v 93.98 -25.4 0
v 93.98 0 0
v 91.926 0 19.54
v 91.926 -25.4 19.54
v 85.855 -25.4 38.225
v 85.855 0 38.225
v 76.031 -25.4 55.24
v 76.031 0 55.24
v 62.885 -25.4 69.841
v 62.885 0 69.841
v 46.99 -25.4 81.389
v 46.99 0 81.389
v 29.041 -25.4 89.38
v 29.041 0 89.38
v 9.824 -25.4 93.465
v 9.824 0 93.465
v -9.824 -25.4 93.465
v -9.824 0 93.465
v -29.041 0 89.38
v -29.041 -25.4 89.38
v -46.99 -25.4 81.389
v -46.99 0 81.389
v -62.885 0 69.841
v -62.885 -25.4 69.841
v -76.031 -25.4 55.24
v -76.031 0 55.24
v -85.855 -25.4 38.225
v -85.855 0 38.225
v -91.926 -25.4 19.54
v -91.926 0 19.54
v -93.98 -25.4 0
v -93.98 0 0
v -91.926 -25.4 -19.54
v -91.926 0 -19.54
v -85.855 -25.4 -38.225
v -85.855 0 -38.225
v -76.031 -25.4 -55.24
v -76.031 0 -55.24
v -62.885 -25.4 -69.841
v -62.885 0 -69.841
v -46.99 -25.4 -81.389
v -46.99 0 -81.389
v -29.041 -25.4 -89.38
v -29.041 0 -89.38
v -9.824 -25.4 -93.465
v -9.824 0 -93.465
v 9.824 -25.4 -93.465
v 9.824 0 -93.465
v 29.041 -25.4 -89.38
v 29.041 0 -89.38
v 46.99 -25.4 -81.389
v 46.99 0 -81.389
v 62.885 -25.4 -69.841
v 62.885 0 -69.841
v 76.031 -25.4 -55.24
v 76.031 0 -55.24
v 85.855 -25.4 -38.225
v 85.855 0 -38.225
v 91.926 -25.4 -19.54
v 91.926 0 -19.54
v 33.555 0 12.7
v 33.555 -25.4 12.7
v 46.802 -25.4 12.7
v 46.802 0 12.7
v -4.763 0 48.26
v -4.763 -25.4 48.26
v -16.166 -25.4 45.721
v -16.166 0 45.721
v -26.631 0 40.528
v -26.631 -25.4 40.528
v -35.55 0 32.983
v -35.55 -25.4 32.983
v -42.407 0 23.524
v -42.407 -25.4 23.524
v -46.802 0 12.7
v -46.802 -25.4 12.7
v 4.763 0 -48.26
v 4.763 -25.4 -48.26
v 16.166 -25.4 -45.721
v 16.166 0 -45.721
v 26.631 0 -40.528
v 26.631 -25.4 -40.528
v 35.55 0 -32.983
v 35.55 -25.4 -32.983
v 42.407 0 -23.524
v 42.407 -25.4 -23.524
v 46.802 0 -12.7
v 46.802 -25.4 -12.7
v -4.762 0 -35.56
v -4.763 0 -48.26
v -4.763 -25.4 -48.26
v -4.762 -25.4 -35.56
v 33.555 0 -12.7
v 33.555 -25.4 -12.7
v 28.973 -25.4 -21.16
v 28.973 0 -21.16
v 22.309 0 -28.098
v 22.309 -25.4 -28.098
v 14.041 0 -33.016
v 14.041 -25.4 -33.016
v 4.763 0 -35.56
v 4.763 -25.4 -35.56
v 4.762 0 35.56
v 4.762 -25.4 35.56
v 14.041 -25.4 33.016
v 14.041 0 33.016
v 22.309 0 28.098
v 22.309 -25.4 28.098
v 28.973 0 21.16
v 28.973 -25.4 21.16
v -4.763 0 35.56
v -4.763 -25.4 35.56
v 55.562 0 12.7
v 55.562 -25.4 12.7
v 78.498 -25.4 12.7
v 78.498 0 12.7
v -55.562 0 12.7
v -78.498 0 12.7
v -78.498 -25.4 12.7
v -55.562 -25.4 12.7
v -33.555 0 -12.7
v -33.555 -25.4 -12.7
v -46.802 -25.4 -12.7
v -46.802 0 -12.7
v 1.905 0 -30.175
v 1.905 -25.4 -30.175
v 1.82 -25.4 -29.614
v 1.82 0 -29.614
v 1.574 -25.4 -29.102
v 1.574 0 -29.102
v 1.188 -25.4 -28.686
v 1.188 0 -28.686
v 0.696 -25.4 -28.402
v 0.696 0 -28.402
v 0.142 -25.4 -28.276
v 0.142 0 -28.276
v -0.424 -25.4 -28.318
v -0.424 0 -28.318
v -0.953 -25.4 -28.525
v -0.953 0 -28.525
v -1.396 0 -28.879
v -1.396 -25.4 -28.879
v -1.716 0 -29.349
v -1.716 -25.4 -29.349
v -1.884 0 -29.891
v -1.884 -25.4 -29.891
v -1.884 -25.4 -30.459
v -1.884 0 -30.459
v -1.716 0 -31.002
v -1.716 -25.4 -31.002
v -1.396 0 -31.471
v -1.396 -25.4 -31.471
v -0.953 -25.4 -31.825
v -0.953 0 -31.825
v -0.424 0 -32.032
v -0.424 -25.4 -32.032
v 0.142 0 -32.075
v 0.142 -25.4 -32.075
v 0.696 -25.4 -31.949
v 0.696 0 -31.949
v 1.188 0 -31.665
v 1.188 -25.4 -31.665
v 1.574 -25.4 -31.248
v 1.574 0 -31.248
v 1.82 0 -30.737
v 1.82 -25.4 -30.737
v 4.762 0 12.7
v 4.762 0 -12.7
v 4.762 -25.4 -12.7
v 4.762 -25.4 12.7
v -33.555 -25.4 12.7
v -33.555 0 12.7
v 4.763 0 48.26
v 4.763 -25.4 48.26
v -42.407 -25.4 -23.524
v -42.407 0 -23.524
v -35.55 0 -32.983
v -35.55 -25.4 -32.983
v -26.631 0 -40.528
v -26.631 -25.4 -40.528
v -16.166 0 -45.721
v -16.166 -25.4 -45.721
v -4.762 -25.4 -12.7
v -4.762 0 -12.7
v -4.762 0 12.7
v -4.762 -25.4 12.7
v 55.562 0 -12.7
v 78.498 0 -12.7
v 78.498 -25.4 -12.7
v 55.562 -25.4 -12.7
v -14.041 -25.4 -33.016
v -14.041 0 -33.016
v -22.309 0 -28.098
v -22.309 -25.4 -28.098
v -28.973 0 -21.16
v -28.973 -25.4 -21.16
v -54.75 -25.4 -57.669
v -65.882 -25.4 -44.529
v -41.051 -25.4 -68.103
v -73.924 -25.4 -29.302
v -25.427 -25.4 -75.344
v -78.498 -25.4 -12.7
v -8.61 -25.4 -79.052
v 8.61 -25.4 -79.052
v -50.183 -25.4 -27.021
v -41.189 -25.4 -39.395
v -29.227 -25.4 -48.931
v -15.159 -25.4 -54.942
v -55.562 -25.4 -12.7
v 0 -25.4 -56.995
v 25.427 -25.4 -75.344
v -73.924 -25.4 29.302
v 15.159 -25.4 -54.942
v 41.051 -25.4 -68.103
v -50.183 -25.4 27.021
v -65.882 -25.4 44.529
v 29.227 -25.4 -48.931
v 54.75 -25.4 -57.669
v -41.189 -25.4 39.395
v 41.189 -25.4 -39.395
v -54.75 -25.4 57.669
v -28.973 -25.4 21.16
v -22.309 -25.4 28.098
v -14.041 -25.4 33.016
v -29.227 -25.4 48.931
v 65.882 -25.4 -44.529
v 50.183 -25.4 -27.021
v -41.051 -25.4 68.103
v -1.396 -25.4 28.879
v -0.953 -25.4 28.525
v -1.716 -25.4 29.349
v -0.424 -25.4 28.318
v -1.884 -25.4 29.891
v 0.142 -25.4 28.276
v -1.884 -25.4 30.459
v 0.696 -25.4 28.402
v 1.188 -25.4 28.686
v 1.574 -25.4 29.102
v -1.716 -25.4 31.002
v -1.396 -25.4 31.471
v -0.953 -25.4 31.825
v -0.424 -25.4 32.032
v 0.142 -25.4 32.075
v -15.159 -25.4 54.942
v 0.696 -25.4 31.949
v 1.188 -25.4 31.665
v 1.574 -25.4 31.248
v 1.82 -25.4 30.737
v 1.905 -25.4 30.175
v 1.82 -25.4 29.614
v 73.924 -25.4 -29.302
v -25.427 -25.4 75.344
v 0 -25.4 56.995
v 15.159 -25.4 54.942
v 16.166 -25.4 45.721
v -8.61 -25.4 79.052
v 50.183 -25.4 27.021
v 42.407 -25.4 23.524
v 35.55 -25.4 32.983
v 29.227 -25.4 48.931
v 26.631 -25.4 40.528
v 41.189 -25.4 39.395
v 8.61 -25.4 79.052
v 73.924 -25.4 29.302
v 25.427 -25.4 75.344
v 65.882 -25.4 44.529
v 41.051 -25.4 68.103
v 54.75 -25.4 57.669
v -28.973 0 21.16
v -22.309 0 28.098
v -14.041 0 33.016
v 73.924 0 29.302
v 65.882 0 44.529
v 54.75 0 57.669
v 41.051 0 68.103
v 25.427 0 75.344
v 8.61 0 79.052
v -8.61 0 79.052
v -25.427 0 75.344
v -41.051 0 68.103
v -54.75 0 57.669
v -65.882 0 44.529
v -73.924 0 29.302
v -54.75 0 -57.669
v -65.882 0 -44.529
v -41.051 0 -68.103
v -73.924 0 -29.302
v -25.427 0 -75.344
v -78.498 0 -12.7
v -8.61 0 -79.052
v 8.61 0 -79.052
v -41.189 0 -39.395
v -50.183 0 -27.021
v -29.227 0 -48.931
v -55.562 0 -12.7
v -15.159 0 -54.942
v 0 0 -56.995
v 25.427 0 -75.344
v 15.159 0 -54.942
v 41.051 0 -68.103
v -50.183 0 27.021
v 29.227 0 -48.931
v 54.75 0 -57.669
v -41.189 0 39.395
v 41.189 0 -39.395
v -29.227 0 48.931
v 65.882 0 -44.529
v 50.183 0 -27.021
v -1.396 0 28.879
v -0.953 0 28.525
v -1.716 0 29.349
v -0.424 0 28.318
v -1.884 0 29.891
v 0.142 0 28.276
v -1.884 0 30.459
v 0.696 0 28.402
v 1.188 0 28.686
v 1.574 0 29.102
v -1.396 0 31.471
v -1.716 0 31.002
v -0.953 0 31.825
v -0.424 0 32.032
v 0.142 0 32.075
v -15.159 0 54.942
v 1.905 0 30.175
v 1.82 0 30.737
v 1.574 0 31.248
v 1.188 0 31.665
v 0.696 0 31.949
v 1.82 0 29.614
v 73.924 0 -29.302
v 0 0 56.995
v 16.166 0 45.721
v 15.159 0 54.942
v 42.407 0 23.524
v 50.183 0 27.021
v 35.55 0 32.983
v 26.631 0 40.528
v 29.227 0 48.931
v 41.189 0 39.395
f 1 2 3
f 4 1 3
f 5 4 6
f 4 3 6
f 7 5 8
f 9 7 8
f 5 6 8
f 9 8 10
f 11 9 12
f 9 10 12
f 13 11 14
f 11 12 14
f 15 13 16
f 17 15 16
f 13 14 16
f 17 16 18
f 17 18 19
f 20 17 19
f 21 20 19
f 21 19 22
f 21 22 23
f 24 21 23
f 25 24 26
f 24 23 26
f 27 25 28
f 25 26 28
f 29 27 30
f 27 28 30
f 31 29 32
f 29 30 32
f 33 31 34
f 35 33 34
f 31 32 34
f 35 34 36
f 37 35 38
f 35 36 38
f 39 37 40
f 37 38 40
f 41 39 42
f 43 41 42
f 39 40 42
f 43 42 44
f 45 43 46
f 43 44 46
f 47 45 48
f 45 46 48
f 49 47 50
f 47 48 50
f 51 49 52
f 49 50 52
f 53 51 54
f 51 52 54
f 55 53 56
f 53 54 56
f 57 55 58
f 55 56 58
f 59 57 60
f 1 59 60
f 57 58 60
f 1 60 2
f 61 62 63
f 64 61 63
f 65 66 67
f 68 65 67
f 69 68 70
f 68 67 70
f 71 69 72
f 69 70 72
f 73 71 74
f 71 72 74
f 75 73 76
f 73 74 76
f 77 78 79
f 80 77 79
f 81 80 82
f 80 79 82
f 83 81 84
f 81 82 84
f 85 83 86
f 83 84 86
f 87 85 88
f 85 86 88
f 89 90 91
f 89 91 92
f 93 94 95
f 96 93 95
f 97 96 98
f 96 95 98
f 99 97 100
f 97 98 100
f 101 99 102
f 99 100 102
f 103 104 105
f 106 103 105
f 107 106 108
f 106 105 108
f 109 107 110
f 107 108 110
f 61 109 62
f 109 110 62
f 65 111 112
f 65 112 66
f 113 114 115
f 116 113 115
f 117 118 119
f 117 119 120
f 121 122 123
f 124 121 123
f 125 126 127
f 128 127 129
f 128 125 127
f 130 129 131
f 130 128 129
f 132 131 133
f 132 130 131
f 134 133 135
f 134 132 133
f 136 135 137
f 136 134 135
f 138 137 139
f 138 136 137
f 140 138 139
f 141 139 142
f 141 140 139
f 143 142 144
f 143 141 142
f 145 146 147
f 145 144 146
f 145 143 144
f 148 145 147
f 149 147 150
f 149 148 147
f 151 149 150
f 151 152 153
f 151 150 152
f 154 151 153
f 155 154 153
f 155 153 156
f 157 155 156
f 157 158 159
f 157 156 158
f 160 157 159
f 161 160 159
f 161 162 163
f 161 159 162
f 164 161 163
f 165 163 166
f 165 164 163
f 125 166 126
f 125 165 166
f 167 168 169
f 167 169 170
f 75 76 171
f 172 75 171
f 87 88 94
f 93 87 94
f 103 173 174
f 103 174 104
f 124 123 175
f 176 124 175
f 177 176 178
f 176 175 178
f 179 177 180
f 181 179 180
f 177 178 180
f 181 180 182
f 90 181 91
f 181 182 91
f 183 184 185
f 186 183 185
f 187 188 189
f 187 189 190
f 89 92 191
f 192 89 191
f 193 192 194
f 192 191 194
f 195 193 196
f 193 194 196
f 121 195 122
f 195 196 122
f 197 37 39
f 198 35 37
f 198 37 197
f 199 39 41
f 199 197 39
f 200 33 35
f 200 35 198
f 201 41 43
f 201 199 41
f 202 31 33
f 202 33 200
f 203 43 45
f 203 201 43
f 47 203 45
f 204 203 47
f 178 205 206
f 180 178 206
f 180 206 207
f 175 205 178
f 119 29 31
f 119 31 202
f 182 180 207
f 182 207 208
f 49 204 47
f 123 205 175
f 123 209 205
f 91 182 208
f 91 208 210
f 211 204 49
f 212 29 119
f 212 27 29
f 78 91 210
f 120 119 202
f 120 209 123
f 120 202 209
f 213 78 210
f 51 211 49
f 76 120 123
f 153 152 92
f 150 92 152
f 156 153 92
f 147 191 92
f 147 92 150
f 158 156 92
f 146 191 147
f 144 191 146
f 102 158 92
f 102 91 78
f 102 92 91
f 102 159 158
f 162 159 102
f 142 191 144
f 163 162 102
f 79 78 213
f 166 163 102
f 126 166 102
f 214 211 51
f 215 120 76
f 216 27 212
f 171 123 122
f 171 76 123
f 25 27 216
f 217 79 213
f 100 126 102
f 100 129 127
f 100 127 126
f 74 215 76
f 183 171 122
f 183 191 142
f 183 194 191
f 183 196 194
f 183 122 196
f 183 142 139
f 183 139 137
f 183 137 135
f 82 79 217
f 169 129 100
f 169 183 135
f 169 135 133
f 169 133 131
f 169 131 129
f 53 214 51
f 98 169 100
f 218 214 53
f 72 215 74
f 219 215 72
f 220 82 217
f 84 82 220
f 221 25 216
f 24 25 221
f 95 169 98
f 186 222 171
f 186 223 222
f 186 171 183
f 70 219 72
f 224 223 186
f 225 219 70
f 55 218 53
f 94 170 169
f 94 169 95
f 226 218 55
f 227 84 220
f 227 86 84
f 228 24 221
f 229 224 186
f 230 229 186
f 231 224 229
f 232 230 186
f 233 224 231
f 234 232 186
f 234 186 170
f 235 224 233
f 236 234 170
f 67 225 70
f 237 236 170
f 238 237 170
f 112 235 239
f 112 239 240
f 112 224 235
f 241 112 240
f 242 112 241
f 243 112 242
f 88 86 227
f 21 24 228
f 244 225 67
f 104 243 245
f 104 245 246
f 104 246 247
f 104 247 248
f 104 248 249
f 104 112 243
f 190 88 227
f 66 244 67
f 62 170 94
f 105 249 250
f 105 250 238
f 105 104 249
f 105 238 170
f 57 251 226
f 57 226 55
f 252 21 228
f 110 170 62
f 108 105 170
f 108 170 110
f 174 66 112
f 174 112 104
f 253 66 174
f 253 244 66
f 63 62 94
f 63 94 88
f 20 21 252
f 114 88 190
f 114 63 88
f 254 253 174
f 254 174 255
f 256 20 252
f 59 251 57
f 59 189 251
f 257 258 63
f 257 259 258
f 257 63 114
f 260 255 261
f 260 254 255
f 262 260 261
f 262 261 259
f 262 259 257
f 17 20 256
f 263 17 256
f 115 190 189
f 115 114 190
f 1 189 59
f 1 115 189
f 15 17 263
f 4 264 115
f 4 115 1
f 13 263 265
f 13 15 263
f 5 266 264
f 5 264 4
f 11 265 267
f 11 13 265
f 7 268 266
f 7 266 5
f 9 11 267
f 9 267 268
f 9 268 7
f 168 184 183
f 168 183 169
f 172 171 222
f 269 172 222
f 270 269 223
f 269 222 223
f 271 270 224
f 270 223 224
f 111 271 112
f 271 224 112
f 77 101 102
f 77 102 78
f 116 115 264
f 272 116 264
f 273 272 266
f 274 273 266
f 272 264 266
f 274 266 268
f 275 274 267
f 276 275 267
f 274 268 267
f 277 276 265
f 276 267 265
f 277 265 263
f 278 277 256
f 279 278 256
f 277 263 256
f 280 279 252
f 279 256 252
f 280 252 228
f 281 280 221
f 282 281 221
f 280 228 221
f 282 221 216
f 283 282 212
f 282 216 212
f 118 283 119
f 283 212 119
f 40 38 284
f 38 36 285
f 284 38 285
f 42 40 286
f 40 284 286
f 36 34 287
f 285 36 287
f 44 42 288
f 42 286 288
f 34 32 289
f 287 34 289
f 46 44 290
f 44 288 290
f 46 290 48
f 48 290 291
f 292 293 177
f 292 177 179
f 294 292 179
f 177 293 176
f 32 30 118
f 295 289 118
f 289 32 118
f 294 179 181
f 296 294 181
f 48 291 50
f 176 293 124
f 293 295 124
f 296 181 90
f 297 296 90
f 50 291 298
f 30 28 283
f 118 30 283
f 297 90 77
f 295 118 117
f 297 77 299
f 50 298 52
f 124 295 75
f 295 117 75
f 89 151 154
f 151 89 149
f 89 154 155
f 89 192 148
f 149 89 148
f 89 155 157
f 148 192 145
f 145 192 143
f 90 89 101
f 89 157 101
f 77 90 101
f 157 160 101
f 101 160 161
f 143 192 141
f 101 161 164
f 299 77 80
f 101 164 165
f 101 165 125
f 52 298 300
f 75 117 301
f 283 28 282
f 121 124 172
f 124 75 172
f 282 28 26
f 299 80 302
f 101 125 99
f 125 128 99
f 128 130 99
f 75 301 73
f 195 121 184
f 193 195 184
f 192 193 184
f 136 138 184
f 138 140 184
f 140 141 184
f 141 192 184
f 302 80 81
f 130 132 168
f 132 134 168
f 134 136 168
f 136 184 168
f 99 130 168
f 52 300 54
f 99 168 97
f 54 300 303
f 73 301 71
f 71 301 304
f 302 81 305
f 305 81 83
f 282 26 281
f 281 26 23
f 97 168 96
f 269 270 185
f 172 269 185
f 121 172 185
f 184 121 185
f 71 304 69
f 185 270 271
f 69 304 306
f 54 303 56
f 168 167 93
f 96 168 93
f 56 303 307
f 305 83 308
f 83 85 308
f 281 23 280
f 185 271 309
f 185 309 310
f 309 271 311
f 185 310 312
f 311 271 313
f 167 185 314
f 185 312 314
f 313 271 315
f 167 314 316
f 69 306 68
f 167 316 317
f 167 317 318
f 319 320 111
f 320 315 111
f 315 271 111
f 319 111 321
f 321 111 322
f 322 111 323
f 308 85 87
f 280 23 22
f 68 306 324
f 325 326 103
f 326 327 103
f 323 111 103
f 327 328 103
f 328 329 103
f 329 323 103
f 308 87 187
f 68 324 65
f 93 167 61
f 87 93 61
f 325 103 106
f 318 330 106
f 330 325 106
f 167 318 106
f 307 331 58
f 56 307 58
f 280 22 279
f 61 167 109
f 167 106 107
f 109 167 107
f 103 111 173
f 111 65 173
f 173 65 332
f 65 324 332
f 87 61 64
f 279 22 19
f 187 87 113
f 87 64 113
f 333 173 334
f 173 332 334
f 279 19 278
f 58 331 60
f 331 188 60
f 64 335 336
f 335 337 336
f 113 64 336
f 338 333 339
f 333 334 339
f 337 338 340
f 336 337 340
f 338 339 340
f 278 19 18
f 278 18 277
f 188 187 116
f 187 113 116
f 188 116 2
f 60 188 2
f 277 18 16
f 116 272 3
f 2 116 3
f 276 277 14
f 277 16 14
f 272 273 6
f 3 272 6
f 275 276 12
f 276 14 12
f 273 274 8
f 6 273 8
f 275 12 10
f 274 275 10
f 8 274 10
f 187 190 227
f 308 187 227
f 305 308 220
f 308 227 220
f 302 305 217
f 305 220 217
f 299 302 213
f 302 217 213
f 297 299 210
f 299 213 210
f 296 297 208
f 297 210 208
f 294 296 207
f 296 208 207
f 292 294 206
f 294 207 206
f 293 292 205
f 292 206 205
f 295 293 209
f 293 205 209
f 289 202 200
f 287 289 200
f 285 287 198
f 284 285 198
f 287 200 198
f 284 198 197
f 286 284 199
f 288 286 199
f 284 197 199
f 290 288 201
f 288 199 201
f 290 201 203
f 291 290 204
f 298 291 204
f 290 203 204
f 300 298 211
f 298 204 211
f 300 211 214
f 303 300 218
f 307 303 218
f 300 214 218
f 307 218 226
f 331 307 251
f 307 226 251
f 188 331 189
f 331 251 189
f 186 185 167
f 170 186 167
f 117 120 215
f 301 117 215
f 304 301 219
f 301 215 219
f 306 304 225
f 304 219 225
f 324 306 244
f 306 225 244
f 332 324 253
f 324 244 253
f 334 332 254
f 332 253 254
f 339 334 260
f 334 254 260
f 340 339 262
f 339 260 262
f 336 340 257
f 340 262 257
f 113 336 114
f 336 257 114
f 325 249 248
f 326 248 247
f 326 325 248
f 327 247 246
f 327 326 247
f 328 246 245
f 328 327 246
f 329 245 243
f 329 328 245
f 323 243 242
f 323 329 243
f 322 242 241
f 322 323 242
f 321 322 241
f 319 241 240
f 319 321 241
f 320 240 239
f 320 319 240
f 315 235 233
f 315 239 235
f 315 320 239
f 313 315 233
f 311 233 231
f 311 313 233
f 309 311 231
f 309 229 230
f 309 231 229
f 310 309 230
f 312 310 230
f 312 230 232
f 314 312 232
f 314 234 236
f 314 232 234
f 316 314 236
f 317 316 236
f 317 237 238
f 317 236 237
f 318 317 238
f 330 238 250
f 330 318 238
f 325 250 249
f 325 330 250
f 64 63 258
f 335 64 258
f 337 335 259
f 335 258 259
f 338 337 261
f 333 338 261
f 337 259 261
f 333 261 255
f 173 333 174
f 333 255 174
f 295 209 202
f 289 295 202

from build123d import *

# Parameters (mm, degrees)
F0_R     = 93.98
F1_DEPTH = 25.4
F2_W     = 9.525
F2_H     = 25.4
F2_R     = 1.905
F3_DEPTH = 25.401
F5_DEPTH = 25.401
F7_DEPTH = 25.401


with BuildPart() as f1:
    # F0 (on Front) → F1 (new body)
    with BuildSketch(Plane.XZ):
        Circle(F0_R)
    extrude(amount=F1_DEPTH)

    # F2 (on Front) → F3 (cut, through all)
    with BuildSketch(Plane.XZ):
        Rectangle(F2_W, F2_H)
        with Locations((0, 30.1752)):
            Circle(F2_R)
        with Locations((0, -30.1752)):
            Circle(F2_R)
    extrude(amount=F3_DEPTH, mode=Mode.SUBTRACT)

    # F4 (on face) → F5 (cut, through all)
    with BuildSketch(Plane.XZ.offset(25.4)):
        with BuildLine():
            ThreePointArc((-55.5625, 12.7), (0, 56.995451), (55.5625, 12.7))
            Line((55.5625, 12.7), (78.498342, 12.7))
            ThreePointArc((78.498342, 12.7), (0, 79.519053), (-78.498342, 12.7))
            Line((-78.498342, 12.7), (-55.5625, 12.7))
        make_face()
        with BuildLine():
            Line((78.498342, -12.7), (55.5625, -12.7))
            ThreePointArc((55.5625, -12.7), (0, -56.995451), (-55.5625, -12.7))
            Line((-55.5625, -12.7), (-78.498342, -12.7))
            ThreePointArc((-78.498342, -12.7), (0, -79.519053), (78.498342, -12.7))
        make_face()
    extrude(amount=-F5_DEPTH, mode=Mode.SUBTRACT)

    # F6 (on face) → F7 (cut, through all)
    with BuildSketch(Plane.XZ.offset(25.4)):
        with BuildLine():
            ThreePointArc((-33.554508, 12.7), (-22.309038, 28.098075), (-4.7625, 35.56))
            Line((-4.7625, 35.56), (-4.7625, 48.26))
            ThreePointArc((-4.7625, 48.26), (-31.318534, 37.025106), (-46.801912, 12.7))
            Line((-46.801912, 12.7), (-33.554508, 12.7))
        make_face()
        with BuildLine():
            Line((4.7625, 48.26), (4.7625, 35.56))
            ThreePointArc((4.7625, 35.56), (22.309038, 28.098075), (33.554508, 12.7))
            Line((33.554508, 12.7), (46.801912, 12.7))
            ThreePointArc((46.801912, 12.7), (31.318534, 37.025106), (4.7625, 48.26))
        make_face()
        with BuildLine():
            ThreePointArc((4.7625, -48.26), (31.318534, -37.025106), (46.801912, -12.7))
            Line((46.801912, -12.7), (33.554508, -12.7))
            ThreePointArc((33.554508, -12.7), (22.309038, -28.098075), (4.7625, -35.56))
            Line((4.7625, -35.56), (4.7625, -48.26))
        make_face()
        with BuildLine():
            Line((-4.7625, -48.26), (-4.7625, -35.56))
            ThreePointArc((-4.7625, -35.56), (-22.309038, -28.098075), (-33.554508, -12.7))
            Line((-33.554508, -12.7), (-46.801912, -12.7))
            ThreePointArc((-46.801912, -12.7), (-31.318534, -37.025106), (-4.7625, -48.26))
        make_face()
    extrude(amount=-F7_DEPTH, mode=Mode.SUBTRACT)


solid = f1.part
